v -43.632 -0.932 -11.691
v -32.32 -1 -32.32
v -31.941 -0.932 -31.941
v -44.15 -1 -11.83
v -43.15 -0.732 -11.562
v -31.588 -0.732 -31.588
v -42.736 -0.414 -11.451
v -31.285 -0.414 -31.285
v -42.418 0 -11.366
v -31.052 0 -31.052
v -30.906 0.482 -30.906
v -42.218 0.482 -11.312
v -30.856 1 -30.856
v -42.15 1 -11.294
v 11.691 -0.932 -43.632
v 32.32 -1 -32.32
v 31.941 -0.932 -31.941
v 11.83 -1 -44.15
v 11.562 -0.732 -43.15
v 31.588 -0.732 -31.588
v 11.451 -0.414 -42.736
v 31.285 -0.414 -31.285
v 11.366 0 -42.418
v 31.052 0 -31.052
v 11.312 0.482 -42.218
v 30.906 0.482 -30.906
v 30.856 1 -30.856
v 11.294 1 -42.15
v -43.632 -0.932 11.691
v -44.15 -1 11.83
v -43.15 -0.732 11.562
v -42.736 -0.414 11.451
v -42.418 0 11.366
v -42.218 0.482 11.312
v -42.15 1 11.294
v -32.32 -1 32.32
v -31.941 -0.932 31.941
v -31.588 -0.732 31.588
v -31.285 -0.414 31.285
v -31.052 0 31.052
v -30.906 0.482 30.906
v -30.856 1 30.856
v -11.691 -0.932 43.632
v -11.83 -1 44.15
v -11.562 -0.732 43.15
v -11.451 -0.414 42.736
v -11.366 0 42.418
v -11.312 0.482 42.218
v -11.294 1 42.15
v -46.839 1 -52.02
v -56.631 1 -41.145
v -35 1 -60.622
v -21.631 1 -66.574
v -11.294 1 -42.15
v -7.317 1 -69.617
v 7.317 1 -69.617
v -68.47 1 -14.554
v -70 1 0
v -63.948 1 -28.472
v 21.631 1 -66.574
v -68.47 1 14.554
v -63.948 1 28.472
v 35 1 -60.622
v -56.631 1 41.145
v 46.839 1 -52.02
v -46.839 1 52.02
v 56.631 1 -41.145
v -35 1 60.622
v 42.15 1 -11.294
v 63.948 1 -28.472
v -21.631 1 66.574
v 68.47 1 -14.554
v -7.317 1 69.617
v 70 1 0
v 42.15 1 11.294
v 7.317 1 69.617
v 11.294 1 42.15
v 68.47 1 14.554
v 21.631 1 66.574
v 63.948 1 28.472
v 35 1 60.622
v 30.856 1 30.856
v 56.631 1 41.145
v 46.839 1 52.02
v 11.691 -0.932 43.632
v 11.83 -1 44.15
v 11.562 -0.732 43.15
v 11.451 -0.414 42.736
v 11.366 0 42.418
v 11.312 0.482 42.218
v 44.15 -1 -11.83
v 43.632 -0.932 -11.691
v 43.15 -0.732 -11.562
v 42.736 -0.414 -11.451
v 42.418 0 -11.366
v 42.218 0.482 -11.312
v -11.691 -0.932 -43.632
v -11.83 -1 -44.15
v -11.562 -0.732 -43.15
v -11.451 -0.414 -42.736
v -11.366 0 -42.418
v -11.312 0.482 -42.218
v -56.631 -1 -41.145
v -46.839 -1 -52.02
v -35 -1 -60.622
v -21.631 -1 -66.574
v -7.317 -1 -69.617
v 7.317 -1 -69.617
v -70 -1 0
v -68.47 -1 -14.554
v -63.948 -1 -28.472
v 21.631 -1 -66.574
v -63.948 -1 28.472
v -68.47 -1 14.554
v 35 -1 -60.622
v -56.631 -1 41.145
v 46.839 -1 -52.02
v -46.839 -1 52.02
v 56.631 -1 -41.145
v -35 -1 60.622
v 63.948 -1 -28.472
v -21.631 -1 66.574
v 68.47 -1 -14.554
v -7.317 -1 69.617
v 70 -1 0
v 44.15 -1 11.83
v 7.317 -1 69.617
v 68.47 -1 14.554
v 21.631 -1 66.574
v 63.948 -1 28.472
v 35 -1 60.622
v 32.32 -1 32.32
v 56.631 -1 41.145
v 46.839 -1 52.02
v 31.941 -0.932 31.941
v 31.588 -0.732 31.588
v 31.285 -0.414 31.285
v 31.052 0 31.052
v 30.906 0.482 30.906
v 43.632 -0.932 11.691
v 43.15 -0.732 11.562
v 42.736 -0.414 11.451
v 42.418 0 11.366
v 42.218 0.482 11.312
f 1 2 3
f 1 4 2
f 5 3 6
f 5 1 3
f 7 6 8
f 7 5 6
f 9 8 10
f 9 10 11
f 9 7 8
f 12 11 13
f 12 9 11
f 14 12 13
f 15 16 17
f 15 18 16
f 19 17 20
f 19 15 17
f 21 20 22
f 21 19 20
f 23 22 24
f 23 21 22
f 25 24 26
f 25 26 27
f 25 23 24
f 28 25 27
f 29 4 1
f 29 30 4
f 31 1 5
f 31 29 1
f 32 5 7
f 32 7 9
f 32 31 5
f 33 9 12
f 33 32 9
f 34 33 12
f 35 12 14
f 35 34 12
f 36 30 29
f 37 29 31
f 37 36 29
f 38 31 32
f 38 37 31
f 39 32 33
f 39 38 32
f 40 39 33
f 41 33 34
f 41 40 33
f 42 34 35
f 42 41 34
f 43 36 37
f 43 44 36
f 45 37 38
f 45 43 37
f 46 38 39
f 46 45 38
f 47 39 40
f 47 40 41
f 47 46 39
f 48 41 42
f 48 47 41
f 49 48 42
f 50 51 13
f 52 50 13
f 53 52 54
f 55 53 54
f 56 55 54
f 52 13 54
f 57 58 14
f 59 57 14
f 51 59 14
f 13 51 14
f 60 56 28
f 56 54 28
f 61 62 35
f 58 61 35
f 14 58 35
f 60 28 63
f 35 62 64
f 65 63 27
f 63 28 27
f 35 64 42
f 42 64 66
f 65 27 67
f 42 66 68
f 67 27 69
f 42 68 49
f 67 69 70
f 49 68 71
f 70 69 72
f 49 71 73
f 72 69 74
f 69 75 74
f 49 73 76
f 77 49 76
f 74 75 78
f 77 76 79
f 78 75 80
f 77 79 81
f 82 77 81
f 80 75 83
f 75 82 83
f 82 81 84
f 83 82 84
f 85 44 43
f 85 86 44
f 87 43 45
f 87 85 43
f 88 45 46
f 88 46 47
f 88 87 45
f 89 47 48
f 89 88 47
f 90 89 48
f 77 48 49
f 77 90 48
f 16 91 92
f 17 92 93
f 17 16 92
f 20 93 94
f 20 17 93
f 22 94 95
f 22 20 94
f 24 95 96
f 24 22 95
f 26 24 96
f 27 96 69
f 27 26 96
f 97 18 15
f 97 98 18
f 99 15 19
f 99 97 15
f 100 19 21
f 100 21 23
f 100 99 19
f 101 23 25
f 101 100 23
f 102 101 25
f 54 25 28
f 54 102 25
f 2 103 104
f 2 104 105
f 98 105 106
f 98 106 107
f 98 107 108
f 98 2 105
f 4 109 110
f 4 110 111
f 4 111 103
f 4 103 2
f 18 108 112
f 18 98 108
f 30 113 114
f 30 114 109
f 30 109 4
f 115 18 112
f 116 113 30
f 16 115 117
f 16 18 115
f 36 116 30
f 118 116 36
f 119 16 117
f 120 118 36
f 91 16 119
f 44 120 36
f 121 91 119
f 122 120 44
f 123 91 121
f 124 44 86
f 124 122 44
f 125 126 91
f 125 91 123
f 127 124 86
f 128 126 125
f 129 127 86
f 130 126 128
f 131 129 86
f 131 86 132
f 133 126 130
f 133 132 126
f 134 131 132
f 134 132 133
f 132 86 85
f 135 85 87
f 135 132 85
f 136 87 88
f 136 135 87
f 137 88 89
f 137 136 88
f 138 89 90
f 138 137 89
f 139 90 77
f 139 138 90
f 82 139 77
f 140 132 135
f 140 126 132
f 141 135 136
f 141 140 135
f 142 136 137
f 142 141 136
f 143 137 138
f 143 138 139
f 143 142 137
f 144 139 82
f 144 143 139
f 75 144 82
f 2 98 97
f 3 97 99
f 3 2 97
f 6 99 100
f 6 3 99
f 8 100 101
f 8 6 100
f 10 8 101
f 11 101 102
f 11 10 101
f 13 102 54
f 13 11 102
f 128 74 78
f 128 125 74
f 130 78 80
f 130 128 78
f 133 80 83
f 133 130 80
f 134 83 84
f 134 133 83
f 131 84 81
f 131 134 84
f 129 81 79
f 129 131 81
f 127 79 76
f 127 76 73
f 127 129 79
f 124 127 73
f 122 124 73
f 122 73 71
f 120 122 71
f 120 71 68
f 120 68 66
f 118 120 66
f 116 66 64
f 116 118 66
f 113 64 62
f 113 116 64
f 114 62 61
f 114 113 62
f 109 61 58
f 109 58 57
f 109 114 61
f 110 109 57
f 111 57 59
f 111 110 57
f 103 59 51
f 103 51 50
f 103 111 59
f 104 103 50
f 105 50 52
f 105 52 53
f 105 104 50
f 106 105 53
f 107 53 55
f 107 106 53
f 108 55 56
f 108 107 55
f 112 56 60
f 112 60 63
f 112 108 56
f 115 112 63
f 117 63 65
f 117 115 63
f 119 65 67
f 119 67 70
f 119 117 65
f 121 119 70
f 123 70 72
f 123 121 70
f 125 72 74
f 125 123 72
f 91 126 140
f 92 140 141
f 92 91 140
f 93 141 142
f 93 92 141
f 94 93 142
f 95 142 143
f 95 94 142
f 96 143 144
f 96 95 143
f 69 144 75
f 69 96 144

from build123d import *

# Parameters (mm, degrees)
F0_R     = 70
F1_DEPTH = 1
F3_R     = 1.99999


# Not quite as in the source:
# - a fillet or chamfer is up to 0.001 mm smaller than in the source, because OpenCascade refuses the exact size
# - a feature of the source that left no trace in its solid (it failed there, or was rolled back) is left out


with BuildPart() as f1:
    # F0 (on Front) → F1 (new body, symmetric)
    with BuildSketch(Plane.XZ):
        Circle(F0_R)
        Polygon((-30.855941539, 30.855941539), (-11.294058461, 42.15), (11.294058461, 42.15), (30.855941539, 30.855941539), (42.15, 11.294058461), (42.15, -11.294058461), (30.855941539, -30.855941539), (11.294058461, -42.15), (-11.294058461, -42.15), (-30.855941539, -30.855941539), (-42.15, -11.294058461), (-42.15, 11.294058461), align=None, mode=Mode.SUBTRACT)
    extrude(amount=F1_DEPTH, both=True)

    # F3 (radius 2 in the source; OpenCascade refuses exactly that, so slightly less here)
    f3_edges = [f1.edges().sort_by_distance(p)[0] for p in [
        (-21.075, -1, 36.502971),
        (0, -1, 42.15),
        (21.075, -1, 36.502971),
        (36.502971, -1, 21.075),
        (42.15, -1, 0),
        (36.502971, -1, -21.075),
        (21.075, -1, -36.502971),
        (0, -1, -42.15),
        (-21.075, -1, -36.502971),
        (-36.502971, -1, -21.075),
        (-42.15, -1, 0),
        (-36.502971, -1, 21.075),
    ]]
    fillet(f3_edges, radius=F3_R)


solid = f1.part
